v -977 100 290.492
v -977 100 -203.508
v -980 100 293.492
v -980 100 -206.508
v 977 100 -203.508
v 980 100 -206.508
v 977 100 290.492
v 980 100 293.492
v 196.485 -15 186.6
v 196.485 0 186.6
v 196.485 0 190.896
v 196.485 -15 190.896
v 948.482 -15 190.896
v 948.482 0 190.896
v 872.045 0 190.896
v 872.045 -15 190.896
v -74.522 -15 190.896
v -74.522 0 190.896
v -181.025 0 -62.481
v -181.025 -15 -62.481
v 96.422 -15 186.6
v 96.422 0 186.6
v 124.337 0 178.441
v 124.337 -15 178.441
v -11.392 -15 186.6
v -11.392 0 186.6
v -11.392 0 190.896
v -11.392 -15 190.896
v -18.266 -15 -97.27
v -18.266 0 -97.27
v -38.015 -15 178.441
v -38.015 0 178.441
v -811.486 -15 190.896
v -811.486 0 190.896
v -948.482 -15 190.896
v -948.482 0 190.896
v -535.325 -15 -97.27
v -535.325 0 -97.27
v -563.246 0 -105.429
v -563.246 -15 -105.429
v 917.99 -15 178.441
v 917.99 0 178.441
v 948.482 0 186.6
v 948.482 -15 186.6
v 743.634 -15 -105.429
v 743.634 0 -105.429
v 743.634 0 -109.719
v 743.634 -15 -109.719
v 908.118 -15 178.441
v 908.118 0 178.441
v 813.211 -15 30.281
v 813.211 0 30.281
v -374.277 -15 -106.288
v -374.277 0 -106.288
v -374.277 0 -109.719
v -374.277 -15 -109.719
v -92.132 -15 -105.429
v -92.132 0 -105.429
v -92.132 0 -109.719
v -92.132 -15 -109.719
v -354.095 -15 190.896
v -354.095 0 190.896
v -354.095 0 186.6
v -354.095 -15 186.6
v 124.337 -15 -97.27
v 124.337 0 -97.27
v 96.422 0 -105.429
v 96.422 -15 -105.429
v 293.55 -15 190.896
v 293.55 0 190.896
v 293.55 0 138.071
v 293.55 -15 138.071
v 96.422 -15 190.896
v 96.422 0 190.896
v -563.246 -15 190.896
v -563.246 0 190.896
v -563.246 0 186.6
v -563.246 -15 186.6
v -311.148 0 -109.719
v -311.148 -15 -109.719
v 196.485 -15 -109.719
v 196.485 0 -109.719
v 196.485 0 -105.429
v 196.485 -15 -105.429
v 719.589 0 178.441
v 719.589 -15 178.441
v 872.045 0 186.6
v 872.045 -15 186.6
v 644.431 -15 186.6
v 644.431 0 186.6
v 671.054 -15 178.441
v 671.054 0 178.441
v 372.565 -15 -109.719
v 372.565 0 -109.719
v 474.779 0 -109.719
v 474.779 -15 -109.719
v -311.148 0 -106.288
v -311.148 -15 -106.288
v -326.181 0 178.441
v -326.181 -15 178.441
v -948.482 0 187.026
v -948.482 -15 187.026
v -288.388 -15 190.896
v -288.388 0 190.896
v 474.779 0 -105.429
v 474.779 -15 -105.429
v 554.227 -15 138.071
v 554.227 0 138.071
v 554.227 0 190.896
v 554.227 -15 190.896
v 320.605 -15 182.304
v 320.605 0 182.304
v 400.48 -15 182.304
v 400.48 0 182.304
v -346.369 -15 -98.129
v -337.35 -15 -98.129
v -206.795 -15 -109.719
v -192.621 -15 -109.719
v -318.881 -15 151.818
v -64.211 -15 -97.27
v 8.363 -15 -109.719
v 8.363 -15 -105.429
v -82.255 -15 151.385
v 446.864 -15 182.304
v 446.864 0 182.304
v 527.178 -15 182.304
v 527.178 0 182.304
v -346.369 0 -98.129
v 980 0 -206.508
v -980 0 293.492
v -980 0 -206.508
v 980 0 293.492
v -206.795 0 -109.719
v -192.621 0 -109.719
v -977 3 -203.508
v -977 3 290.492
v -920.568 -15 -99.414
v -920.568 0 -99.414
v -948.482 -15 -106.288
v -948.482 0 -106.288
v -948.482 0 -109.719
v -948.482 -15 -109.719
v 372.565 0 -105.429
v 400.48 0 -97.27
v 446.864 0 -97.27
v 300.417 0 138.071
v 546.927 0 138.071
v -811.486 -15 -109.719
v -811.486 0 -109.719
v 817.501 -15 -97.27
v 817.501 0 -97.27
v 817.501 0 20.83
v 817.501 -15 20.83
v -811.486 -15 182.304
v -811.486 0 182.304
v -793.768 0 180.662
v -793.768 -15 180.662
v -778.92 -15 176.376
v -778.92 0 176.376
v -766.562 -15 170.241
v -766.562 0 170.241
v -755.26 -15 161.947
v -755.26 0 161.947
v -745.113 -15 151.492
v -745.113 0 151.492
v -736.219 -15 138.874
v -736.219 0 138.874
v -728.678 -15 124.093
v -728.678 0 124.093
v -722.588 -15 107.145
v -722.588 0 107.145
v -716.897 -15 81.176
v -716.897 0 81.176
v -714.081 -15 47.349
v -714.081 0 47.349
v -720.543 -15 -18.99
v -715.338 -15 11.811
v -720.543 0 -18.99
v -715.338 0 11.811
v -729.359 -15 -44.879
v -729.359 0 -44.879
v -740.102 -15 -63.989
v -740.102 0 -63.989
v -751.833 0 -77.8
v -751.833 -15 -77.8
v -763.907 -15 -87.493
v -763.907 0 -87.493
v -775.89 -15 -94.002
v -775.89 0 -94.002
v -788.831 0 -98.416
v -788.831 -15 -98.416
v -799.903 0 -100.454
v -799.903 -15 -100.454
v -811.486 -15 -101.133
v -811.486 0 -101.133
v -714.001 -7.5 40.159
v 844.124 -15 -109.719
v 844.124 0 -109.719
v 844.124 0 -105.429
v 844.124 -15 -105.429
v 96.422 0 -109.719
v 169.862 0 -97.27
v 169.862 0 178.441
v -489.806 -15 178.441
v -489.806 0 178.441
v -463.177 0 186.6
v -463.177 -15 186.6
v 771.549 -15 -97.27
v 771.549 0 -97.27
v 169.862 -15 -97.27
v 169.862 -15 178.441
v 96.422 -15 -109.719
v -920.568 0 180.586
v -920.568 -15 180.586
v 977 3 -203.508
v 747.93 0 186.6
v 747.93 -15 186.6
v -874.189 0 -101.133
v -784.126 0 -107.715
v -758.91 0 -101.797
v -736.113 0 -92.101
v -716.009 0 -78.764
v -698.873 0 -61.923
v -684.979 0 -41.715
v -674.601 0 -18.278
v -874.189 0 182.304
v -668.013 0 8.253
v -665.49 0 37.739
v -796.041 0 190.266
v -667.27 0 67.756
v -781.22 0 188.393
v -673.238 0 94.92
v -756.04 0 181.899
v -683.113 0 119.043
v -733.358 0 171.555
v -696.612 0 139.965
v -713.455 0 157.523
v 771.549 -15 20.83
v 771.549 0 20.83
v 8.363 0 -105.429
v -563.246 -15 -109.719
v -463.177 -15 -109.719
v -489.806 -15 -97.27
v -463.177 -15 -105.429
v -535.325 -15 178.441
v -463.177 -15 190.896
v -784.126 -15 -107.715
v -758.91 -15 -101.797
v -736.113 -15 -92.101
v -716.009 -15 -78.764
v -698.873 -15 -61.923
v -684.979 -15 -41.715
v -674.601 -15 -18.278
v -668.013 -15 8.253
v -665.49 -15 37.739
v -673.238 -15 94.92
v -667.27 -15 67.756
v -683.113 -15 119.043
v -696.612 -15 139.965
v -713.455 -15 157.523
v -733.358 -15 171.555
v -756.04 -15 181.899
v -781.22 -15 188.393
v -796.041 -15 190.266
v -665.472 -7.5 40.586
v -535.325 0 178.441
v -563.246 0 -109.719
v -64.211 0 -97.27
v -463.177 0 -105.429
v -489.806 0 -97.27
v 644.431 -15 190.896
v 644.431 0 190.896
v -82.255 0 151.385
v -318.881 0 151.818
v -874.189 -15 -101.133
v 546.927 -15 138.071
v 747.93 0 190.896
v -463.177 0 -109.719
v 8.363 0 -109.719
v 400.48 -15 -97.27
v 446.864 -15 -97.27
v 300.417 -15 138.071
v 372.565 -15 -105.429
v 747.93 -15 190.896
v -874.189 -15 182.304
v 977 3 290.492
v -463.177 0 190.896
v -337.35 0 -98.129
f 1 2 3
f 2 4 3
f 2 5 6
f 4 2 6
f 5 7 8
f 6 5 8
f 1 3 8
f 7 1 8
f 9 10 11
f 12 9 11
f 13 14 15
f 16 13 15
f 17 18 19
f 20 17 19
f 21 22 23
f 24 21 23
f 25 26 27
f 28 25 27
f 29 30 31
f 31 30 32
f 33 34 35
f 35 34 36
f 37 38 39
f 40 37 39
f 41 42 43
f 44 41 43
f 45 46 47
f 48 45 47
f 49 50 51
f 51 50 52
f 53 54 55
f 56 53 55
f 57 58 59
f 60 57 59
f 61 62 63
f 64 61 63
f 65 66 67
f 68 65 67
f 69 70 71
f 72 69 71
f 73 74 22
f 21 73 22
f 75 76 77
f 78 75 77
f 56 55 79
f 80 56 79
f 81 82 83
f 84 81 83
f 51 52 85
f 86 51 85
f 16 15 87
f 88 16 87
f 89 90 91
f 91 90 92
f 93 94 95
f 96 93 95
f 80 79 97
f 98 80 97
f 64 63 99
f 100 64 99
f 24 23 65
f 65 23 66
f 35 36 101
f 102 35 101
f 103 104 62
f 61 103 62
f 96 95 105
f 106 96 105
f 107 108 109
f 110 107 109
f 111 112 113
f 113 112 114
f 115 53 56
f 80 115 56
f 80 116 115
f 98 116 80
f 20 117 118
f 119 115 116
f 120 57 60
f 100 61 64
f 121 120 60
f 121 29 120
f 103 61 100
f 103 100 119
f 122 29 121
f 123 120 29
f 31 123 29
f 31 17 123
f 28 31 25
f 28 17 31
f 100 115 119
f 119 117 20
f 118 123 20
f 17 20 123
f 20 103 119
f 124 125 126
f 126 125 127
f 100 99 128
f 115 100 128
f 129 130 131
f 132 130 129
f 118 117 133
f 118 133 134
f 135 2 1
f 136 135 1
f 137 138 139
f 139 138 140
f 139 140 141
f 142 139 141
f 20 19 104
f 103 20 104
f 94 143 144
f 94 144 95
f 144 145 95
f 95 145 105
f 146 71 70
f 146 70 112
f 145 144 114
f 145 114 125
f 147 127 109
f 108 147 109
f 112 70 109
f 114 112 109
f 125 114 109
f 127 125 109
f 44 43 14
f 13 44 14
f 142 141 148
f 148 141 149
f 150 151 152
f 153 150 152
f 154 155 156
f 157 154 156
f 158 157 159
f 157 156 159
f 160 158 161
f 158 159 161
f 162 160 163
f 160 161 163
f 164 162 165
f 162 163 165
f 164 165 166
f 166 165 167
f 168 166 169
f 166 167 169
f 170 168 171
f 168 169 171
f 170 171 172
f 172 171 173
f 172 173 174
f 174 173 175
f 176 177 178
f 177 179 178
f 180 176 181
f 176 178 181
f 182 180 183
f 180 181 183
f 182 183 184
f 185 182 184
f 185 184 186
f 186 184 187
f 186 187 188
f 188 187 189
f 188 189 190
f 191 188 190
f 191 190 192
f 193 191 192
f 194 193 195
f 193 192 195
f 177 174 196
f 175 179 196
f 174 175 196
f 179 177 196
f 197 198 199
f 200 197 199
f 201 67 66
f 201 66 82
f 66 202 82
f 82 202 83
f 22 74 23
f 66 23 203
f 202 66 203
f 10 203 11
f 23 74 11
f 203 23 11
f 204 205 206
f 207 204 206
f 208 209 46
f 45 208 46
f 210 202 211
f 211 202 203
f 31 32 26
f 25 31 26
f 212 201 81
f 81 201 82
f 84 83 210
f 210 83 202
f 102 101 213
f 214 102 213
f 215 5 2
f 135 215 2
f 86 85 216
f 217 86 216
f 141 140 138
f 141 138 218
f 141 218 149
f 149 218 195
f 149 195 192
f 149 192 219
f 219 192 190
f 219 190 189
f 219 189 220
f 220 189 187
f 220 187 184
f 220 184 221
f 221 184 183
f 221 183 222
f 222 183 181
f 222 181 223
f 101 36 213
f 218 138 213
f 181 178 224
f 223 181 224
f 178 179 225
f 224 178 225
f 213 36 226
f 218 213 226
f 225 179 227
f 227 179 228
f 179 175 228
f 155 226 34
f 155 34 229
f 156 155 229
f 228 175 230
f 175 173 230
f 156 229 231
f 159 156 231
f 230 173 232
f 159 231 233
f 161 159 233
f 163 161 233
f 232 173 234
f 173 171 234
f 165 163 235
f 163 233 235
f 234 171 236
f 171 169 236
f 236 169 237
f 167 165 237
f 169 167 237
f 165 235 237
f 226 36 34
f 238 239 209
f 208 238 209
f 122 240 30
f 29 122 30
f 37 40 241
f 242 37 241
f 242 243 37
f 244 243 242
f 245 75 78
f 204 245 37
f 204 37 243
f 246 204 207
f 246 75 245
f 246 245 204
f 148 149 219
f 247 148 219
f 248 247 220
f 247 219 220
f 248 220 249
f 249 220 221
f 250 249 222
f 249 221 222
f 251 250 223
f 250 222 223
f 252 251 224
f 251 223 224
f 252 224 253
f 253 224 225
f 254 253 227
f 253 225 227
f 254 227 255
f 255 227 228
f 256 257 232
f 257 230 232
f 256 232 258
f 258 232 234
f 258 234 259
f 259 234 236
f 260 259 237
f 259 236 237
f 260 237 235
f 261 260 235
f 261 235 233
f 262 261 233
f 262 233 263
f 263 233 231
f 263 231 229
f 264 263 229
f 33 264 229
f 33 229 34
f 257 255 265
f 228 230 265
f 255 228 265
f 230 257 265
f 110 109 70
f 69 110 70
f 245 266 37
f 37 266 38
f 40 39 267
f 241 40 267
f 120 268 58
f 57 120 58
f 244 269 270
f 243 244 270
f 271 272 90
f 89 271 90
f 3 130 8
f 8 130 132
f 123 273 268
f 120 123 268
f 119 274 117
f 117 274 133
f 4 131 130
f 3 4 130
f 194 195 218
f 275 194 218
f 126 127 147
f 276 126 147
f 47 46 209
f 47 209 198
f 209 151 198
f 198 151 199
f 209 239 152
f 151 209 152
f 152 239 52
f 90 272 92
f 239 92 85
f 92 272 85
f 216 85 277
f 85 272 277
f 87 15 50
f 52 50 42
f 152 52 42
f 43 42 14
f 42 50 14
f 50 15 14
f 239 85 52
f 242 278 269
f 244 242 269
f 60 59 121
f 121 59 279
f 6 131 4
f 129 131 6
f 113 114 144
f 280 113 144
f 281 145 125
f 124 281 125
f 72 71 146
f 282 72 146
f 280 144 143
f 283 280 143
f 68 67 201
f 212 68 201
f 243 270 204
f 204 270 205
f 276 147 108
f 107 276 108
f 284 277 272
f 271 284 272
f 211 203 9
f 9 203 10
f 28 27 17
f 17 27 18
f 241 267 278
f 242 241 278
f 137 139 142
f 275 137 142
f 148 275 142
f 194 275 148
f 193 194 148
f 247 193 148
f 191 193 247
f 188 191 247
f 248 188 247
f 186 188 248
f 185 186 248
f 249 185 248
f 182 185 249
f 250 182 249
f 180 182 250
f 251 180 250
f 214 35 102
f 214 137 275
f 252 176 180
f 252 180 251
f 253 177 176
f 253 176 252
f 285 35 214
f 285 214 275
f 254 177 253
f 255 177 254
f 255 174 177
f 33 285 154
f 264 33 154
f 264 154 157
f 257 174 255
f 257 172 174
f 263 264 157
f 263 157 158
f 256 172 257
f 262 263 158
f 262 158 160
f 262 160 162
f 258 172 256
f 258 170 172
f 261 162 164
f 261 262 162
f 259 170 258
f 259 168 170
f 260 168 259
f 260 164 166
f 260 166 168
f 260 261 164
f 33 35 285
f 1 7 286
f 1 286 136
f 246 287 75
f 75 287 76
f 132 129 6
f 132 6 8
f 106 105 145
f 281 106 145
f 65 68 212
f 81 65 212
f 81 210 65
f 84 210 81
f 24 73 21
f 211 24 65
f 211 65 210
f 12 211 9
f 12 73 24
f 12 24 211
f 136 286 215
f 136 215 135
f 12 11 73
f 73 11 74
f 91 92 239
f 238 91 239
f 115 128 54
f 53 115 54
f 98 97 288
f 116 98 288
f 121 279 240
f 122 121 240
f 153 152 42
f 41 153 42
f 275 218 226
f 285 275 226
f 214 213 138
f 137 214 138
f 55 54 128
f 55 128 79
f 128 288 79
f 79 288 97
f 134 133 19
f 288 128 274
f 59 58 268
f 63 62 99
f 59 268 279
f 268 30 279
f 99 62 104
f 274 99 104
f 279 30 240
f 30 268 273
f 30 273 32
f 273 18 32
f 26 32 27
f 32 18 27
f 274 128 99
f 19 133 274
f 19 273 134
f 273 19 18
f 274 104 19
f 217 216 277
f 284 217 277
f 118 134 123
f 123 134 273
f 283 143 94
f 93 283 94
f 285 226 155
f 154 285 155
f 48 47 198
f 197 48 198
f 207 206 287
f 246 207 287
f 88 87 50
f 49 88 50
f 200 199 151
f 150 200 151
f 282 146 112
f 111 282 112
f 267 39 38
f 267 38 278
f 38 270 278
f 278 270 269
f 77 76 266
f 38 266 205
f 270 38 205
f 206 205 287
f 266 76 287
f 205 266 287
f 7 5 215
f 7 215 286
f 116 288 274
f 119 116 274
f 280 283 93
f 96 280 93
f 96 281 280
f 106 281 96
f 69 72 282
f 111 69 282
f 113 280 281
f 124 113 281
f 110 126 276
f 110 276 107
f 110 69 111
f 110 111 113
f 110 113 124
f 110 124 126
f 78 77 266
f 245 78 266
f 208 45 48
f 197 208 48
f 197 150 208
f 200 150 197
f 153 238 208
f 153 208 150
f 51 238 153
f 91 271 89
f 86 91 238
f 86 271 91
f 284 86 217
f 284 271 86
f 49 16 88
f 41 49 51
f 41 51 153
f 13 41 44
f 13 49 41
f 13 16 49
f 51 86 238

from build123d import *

# Parameters (mm, degrees)
F1_DEPTH = 15
F2_W     = 1960
F2_H     = 500
F3_DEPTH = 100
F4_W     = 1954
F4_H     = 494
F5_DEPTH = 97


with BuildPart() as f1:
    # F0 (on Front) → F1 (new body)
    with BuildSketch(Plane.XZ):
        with BuildLine():
            Line((-811.4863290109, 190.8960236935), (-948.4822653052, 190.8960236935))
            Line((-948.4822653052, 190.8960236935), (-948.4822653052, 187.026470246))
            Line((-948.4822653052, 187.026470246), (-920.5675615954, 180.5855808972))
            Line((-920.5675615954, 180.5855808972), (-920.5675615954, -99.4144191028))
            Line((-920.5675615954, -99.4144191028), (-948.4822653052, -106.2880248782))
            Line((-948.4822653052, -106.2880248782), (-948.4822653052, -109.7185700347))
            Line((-948.4822653052, -109.7185700347), (-811.4863290109, -109.7185700347))
            add(Edge.make_bspline(
                [(-811.4863290109, -109.7185700347), (-725.5950765146, -109.7185700347), (-665.4719211129, -53.8951927924), (-665.4719211129, 40.5855808972)],
                knots=[0, 0, 0, 0, 1, 1, 1, 1], degree=3))
            add(Edge.make_bspline(
                [(-665.4719211129, 40.5855808972), (-665.4719211129, 134.2074070186), (-725.5950765146, 190.8960236935), (-811.4863290109, 190.8960236935)],
                knots=[0, 0, 0, 0, 1, 1, 1, 1], degree=3))
        make_face()
        with BuildLine():
            Line((-874.1893877168, -101.1328034801), (-874.1893877168, 182.3039994076))
            Line((-874.1893877168, 182.3039994076), (-811.4863290109, 182.3039994076))
            add(Edge.make_bspline(
                [(-811.4863290109, 182.3039994076), (-754.7954481751, 182.3039994076), (-714.0012413063, 135.0653647276), (-714.0012413063, 40.1591222018)],
                knots=[0, 0, 0, 0, 1, 1, 1, 1], degree=3))
            add(Edge.make_bspline(
                [(-714.0012413063, 40.1591222018), (-714.0012413063, -54.3216514878), (-754.7954481751, -101.1328034801), (-811.4863290109, -101.1328034801)],
                knots=[0, 0, 0, 0, 1, 1, 1, 1], degree=3))
            Line((-811.4863290109, -101.1328034801), (-874.1893877168, -101.1328034801))
        make_face(mode=Mode.SUBTRACT)
    extrude(amount=F1_DEPTH)


with BuildPart() as f1b:
    # F0 (on Front) → F1, piece 2 (new body)
    with BuildSketch(Plane.XZ):
        Polygon((-463.1765365311, 190.8960236935), (-563.2455211101, 190.8960236935), (-563.2455211101, 186.6000115506), (-535.3245482914, 178.4407036914), (-535.3245482914, -97.2695418969), (-563.2455211101, -105.428815623), (-563.2455211101, -109.7185700347), (-463.1765365311, -109.7185700347), (-463.1765365311, -105.428815623), (-489.8055495349, -97.2695418969), (-489.8055495349, 178.4407036914), (-463.1765365311, 186.6000115506), align=None)
    extrude(amount=F1_DEPTH)


with BuildPart() as f1c:
    # F0 (on Front) → F1, piece 3 (new body)
    with BuildSketch(Plane.XZ):
        Polygon((-288.3881929127, 190.8960236935), (-354.0953039465, 190.8960236935), (-354.0953039465, 186.6000115506), (-326.1806002367, 178.4407036914), (-346.3687466471, -98.1287511521), (-374.2771926257, -106.2880248782), (-374.2771926257, -109.7185700347), (-311.1476752244, -109.7185700347), (-311.1476752244, -106.2880248782), (-337.3502522882, -98.1287511521), (-318.8805243881, 151.8179484188), (-206.7952394757, -109.7185700347), (-192.6214895855, -109.7185700347), (-82.2546231834, 151.3851978591), (-64.2113539788, -97.2695418969), (-92.1323154199, -105.428815623), (-92.1323154199, -109.7185700347), (8.3631164769, -109.7185700347), (8.3631164769, -105.428815623), (-18.2659306599, -97.2695418969), (-38.0150574017, 178.4407036914), (-11.3922793737, 186.6000115506), (-11.3922793737, 190.8960236935), (-74.5217967751, 190.8960236935), (-181.0254129717, -62.4811869009), align=None)
    extrude(amount=F1_DEPTH)


with BuildPart() as f1d:
    # F0 (on Front) → F1, piece 4 (new body)
    with BuildSketch(Plane.XZ):
        Polygon((196.4847853017, 190.8960236935), (96.4220698316, 190.8960236935), (96.4220698316, 186.6000115506), (124.3367735414, 178.4407036914), (124.3367735414, -97.2695418969), (96.4220698316, -105.428815623), (96.4220698316, -109.7185700347), (196.4847853017, -109.7185700347), (196.4847853017, -105.428815623), (169.8620414068, -97.2695418969), (169.8620414068, 178.4407036914), (196.4847853017, 186.6000115506), align=None)
    extrude(amount=F1_DEPTH)


with BuildPart() as f1e:
    # F0 (on Front) → F1, piece 5 (new body)
    with BuildSketch(Plane.XZ):
        Polygon((554.2270267512, 190.8960236935), (293.5497061751, 190.8960236935), (293.5497061751, 138.0707027349), (300.4170542193, 138.0707027349), (320.6052006298, 182.3039994076), (400.4797696895, 182.3039994076), (400.4797696895, -97.2695418969), (372.5650659796, -105.428815623), (372.5650659796, -109.7185700347), (474.7789163869, -109.7185700347), (474.7789163869, -105.428815623), (446.864212677, -97.2695418969), (446.864212677, 182.3039994076), (527.1777900278, 182.3039994076), (546.9269281472, 138.0707027349), (554.2270267512, 138.0707027349), align=None)
    extrude(amount=F1_DEPTH)


with BuildPart() as f1f:
    # F0 (on Front) → F1, piece 6 (new body)
    with BuildSketch(Plane.XZ):
        Polygon((747.9303756695, 190.8960236935), (644.4308231785, 190.8960236935), (644.4308231785, 186.6000115506), (671.0536012065, 178.4407036914), (771.549044481, 20.8301850466), (771.549044481, -97.2695418969), (743.6343635266, -105.428815623), (743.6343635266, -109.7185700347), (844.1235376921, -109.7185700347), (844.1235376921, -105.428815623), (817.5007596642, -97.2695418969), (817.5007596642, 20.8301850466), (917.9899338298, 178.4407036914), (948.4822653052, 186.6000115506), (948.4822653052, 190.8960236935), (872.0445105109, 190.8960236935), (872.0445105109, 186.6000115506), (908.1184879468, 178.4407036914), (813.2110052525, 30.2814185876), (719.5891791311, 178.4407036914), (747.9303756695, 186.6000115506), align=None)
    extrude(amount=F1_DEPTH)


with BuildPart() as f3:
    # F2 (on Front) → F3 (new body)
    with BuildSketch(Plane.XZ):
        with Locations((0, 43.4922596839)):
            Rectangle(F2_W, F2_H)
    extrude(amount=-F3_DEPTH)

    # F4 (on face) → F5 (cut)
    with BuildSketch(Plane(origin=(0, 100, 0), x_dir=(-1, 0, 0), z_dir=(0, 1, 0))):
        with Locations((0, 43.4922596839)):
            Rectangle(F4_W, F4_H)
    extrude(amount=-F5_DEPTH, mode=Mode.SUBTRACT)


solid = Compound([f1.part, f1b.part, f1c.part, f1d.part, f1e.part, f1f.part, f3.part])
